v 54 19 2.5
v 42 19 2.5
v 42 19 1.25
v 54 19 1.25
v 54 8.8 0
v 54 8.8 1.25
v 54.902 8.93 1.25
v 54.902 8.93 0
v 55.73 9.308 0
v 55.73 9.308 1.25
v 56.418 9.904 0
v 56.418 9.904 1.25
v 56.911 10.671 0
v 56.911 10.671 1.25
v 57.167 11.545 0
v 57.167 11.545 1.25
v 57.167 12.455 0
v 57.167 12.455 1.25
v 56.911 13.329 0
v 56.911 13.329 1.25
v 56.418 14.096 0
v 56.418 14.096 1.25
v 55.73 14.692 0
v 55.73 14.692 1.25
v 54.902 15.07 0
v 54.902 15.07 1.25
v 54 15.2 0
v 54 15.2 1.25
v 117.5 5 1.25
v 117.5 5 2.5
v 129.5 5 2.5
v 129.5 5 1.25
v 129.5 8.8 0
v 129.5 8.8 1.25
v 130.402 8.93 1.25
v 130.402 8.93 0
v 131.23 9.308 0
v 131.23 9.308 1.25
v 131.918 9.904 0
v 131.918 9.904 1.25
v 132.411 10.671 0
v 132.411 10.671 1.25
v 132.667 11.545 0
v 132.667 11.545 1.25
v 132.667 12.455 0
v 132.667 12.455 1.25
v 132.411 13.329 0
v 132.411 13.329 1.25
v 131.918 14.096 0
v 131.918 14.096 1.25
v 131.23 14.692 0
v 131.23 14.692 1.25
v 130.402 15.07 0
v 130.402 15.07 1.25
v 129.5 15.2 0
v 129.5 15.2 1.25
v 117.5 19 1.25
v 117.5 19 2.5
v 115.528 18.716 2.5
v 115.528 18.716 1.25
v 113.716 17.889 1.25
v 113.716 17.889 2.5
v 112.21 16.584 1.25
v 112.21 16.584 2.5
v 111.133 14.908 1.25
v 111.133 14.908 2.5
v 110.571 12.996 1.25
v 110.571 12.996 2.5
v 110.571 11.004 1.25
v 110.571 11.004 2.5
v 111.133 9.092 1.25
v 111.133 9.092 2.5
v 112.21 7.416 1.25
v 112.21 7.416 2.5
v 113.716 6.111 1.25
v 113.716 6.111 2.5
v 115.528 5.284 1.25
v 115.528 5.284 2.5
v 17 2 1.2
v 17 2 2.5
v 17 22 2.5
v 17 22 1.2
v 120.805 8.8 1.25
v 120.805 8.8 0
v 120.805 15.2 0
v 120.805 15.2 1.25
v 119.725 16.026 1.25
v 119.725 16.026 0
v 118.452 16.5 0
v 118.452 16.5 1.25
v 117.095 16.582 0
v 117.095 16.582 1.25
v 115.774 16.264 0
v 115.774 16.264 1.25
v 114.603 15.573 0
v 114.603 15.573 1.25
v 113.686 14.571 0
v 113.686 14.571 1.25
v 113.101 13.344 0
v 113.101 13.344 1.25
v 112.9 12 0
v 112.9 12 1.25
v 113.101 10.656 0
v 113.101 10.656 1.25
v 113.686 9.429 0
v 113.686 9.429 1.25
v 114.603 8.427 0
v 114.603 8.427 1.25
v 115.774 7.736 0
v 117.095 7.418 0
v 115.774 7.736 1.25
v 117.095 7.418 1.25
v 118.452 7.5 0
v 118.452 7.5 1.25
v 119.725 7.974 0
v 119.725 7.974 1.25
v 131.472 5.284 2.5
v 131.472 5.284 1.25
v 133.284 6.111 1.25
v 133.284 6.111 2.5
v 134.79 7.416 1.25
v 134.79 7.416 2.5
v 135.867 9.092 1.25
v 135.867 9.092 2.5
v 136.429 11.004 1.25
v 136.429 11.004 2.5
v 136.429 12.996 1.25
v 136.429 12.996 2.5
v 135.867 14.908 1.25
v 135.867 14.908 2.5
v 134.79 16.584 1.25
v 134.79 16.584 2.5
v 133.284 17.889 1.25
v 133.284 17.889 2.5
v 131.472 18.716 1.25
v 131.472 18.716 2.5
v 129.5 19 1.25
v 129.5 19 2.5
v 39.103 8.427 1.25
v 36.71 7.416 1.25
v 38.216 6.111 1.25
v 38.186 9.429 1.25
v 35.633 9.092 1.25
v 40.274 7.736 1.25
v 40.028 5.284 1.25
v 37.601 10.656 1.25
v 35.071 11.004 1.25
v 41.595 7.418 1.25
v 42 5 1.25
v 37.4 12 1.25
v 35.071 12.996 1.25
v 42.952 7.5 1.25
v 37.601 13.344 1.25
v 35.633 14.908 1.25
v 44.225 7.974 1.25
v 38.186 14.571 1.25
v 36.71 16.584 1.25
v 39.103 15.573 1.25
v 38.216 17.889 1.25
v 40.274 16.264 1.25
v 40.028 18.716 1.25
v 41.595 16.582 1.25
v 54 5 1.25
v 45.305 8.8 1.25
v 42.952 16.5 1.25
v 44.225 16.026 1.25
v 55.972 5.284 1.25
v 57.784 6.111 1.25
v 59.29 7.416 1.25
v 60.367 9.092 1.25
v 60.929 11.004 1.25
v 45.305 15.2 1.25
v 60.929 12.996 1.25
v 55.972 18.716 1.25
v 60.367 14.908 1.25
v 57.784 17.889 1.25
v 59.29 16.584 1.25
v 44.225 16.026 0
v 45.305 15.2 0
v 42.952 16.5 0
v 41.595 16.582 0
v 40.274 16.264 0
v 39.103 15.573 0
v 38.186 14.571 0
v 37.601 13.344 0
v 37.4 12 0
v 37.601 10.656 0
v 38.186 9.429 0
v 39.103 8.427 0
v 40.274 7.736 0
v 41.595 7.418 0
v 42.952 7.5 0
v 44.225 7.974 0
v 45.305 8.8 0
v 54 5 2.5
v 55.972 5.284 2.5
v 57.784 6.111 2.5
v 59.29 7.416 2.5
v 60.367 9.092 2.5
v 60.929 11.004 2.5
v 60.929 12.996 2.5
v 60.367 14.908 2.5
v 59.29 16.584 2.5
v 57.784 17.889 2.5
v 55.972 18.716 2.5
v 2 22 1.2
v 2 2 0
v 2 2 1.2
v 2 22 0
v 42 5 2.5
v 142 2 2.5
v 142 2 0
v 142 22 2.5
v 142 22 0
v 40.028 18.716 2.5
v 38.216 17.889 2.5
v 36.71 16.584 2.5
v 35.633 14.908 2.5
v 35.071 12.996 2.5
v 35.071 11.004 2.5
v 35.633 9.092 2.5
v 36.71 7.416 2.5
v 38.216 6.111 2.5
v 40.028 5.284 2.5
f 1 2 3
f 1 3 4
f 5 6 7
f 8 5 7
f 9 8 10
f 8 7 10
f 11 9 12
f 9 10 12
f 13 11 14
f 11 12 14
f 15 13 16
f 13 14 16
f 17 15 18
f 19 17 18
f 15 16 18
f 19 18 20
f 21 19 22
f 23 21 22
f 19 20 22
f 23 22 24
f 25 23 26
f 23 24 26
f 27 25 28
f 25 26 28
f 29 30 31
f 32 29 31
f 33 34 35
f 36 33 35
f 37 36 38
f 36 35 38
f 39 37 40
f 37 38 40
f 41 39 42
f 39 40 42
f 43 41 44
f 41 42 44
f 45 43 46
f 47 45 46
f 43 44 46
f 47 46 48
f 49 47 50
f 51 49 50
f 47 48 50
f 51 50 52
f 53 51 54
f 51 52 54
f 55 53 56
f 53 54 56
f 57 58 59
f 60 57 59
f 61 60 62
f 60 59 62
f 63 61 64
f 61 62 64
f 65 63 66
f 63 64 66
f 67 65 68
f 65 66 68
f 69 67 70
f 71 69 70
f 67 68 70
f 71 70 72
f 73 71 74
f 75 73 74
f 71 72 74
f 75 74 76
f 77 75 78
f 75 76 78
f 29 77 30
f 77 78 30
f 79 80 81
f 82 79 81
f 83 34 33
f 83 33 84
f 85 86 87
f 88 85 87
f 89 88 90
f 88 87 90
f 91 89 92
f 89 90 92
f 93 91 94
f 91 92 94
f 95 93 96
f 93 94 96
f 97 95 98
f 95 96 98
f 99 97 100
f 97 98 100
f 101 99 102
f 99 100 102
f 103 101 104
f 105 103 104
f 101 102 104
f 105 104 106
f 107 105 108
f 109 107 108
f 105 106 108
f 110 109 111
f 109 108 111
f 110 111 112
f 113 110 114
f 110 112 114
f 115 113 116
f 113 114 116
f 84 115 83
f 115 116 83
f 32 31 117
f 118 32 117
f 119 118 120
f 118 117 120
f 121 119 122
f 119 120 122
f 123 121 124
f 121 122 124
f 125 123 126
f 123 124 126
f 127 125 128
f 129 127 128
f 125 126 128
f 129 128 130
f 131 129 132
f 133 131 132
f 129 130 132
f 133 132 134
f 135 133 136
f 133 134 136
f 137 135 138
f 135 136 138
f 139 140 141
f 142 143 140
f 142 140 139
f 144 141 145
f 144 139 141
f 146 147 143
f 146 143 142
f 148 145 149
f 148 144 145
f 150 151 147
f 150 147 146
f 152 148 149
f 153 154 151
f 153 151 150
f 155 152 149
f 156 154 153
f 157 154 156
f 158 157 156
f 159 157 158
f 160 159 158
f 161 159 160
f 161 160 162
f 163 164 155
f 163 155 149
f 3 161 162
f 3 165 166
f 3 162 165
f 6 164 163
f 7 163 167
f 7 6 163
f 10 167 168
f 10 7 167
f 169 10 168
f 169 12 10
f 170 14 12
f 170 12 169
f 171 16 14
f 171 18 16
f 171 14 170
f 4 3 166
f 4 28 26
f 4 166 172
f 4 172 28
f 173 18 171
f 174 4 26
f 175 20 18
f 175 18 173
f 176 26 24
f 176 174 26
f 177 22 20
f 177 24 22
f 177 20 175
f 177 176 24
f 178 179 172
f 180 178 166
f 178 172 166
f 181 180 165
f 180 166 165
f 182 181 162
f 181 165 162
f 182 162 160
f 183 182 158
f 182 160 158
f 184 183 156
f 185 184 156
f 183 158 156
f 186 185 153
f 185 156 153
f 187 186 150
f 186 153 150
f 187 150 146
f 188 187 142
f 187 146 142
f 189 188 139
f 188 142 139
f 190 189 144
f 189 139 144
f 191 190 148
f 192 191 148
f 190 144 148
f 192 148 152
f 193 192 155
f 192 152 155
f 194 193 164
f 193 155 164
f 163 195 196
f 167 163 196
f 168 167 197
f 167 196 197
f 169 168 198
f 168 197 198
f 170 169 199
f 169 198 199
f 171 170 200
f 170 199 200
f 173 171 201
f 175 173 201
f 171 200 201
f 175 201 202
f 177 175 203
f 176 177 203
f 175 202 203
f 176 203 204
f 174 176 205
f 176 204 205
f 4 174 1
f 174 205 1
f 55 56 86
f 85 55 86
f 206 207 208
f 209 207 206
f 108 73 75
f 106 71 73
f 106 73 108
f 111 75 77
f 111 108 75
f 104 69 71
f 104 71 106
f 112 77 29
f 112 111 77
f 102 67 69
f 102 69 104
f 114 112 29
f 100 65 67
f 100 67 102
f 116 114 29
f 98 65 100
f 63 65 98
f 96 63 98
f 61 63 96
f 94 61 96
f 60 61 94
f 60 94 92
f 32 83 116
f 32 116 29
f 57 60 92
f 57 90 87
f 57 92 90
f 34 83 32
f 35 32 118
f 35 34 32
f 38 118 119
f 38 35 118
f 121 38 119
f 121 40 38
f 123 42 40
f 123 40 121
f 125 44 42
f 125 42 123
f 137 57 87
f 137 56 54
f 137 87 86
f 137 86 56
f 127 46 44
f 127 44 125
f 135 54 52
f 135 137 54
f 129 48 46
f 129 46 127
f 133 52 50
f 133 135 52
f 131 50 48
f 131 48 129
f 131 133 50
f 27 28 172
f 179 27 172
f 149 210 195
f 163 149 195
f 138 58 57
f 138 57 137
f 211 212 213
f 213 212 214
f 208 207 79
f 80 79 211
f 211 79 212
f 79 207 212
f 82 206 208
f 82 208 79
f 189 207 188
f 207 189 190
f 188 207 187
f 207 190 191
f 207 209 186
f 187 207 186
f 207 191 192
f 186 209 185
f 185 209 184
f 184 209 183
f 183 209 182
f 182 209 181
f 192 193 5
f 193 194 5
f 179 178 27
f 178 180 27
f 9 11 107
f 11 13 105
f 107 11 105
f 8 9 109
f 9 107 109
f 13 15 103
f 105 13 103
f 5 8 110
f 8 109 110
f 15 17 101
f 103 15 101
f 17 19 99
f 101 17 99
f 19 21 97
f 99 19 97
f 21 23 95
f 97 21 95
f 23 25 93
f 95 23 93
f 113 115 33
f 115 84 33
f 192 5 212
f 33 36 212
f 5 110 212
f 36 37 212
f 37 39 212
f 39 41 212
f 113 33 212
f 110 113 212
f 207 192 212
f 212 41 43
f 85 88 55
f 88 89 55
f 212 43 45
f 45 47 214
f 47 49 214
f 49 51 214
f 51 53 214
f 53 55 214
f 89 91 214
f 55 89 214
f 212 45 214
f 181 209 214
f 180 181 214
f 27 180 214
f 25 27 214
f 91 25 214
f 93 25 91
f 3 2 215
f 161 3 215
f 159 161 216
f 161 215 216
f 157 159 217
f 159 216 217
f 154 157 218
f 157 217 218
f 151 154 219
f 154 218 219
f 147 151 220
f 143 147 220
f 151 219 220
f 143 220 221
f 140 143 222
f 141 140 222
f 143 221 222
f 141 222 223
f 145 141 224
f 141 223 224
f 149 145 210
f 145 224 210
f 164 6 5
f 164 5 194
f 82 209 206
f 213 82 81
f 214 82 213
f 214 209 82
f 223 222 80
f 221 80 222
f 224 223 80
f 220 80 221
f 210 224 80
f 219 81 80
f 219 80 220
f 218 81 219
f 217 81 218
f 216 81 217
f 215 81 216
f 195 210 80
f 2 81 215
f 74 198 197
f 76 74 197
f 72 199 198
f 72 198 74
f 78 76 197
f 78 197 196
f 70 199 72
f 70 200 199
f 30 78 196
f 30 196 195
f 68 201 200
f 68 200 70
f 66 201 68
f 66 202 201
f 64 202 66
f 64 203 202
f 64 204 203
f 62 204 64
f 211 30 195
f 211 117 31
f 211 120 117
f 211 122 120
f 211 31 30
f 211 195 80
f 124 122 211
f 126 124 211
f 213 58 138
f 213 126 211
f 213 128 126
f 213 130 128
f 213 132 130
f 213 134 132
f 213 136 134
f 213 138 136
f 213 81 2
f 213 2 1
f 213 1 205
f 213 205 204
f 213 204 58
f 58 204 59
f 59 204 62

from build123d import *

# Parameters (mm, degrees)
SKETCH_W        = 140
SKETCH_H        = 20
PAD_DEPTH       = 2.5
SKETCH001_W     = 15
SKETCH001_H     = 20
POCKET_DEPTH    = 1.3
POCKET001_DEPTH = 1.25
SKETCH003_R     = 4.6
POCKET002_DEPTH = 1.251


with BuildPart() as part:
    # Sketch → Pad (new body)
    with BuildSketch(Plane.XY):
        with Locations((72, 12)):
            Rectangle(SKETCH_W, SKETCH_H)
    extrude(amount=PAD_DEPTH)

    # Sketch001 → Pocket (cut)
    with BuildSketch(Plane.XY.offset(2.5)):
        with Locations((9.5, 12)):
            Rectangle(SKETCH001_W, SKETCH001_H)
    extrude(amount=-POCKET_DEPTH, mode=Mode.SUBTRACT)

    # Sketch002 → Pocket001 (cut)
    with BuildSketch(Plane.XY.offset(2.5)):
        with BuildLine():
            ThreePointArc((42, 19), (35, 12), (42, 5))
            Line((42, 5), (54, 5))
            ThreePointArc((54, 5), (61, 12), (54, 19))
            Line((42, 19), (54, 19))
        make_face()
        with BuildLine():
            ThreePointArc((117.5, 19), (110.5, 12), (117.5, 5))
            Line((117.5, 5), (129.5, 5))
            ThreePointArc((129.5, 5), (136.5, 12), (129.5, 19))
            Line((117.5, 19), (129.5, 19))
        make_face()
    extrude(amount=-POCKET001_DEPTH, mode=Mode.SUBTRACT)

    # Sketch003 → Pocket002 (cut, through all)
    with BuildSketch(Plane.XY.offset(1.25)):
        with Locations((42, 12)):
            Circle(SKETCH003_R)
        with Locations((117.5, 12)):
            Circle(SKETCH003_R)
        with BuildLine():
            ThreePointArc((54, 8.8), (57.2, 12), (54, 15.2))
            Line((54, 15.2), (44, 15.2))
            ThreePointArc((44, 15.2), (40.8, 12), (44, 8.8))
            Line((54, 8.8), (44, 8.8))
        make_face()
        with BuildLine():
            ThreePointArc((129.5, 8.8), (132.7, 12), (129.5, 15.2))
            Line((129.5, 15.2), (119.5, 15.2))
            ThreePointArc((119.5, 15.2), (116.3, 12), (119.5, 8.8))
            Line((129.5, 8.8), (119.5, 8.8))
        make_face()
    extrude(amount=-POCKET002_DEPTH, mode=Mode.SUBTRACT)


solid = part.part
